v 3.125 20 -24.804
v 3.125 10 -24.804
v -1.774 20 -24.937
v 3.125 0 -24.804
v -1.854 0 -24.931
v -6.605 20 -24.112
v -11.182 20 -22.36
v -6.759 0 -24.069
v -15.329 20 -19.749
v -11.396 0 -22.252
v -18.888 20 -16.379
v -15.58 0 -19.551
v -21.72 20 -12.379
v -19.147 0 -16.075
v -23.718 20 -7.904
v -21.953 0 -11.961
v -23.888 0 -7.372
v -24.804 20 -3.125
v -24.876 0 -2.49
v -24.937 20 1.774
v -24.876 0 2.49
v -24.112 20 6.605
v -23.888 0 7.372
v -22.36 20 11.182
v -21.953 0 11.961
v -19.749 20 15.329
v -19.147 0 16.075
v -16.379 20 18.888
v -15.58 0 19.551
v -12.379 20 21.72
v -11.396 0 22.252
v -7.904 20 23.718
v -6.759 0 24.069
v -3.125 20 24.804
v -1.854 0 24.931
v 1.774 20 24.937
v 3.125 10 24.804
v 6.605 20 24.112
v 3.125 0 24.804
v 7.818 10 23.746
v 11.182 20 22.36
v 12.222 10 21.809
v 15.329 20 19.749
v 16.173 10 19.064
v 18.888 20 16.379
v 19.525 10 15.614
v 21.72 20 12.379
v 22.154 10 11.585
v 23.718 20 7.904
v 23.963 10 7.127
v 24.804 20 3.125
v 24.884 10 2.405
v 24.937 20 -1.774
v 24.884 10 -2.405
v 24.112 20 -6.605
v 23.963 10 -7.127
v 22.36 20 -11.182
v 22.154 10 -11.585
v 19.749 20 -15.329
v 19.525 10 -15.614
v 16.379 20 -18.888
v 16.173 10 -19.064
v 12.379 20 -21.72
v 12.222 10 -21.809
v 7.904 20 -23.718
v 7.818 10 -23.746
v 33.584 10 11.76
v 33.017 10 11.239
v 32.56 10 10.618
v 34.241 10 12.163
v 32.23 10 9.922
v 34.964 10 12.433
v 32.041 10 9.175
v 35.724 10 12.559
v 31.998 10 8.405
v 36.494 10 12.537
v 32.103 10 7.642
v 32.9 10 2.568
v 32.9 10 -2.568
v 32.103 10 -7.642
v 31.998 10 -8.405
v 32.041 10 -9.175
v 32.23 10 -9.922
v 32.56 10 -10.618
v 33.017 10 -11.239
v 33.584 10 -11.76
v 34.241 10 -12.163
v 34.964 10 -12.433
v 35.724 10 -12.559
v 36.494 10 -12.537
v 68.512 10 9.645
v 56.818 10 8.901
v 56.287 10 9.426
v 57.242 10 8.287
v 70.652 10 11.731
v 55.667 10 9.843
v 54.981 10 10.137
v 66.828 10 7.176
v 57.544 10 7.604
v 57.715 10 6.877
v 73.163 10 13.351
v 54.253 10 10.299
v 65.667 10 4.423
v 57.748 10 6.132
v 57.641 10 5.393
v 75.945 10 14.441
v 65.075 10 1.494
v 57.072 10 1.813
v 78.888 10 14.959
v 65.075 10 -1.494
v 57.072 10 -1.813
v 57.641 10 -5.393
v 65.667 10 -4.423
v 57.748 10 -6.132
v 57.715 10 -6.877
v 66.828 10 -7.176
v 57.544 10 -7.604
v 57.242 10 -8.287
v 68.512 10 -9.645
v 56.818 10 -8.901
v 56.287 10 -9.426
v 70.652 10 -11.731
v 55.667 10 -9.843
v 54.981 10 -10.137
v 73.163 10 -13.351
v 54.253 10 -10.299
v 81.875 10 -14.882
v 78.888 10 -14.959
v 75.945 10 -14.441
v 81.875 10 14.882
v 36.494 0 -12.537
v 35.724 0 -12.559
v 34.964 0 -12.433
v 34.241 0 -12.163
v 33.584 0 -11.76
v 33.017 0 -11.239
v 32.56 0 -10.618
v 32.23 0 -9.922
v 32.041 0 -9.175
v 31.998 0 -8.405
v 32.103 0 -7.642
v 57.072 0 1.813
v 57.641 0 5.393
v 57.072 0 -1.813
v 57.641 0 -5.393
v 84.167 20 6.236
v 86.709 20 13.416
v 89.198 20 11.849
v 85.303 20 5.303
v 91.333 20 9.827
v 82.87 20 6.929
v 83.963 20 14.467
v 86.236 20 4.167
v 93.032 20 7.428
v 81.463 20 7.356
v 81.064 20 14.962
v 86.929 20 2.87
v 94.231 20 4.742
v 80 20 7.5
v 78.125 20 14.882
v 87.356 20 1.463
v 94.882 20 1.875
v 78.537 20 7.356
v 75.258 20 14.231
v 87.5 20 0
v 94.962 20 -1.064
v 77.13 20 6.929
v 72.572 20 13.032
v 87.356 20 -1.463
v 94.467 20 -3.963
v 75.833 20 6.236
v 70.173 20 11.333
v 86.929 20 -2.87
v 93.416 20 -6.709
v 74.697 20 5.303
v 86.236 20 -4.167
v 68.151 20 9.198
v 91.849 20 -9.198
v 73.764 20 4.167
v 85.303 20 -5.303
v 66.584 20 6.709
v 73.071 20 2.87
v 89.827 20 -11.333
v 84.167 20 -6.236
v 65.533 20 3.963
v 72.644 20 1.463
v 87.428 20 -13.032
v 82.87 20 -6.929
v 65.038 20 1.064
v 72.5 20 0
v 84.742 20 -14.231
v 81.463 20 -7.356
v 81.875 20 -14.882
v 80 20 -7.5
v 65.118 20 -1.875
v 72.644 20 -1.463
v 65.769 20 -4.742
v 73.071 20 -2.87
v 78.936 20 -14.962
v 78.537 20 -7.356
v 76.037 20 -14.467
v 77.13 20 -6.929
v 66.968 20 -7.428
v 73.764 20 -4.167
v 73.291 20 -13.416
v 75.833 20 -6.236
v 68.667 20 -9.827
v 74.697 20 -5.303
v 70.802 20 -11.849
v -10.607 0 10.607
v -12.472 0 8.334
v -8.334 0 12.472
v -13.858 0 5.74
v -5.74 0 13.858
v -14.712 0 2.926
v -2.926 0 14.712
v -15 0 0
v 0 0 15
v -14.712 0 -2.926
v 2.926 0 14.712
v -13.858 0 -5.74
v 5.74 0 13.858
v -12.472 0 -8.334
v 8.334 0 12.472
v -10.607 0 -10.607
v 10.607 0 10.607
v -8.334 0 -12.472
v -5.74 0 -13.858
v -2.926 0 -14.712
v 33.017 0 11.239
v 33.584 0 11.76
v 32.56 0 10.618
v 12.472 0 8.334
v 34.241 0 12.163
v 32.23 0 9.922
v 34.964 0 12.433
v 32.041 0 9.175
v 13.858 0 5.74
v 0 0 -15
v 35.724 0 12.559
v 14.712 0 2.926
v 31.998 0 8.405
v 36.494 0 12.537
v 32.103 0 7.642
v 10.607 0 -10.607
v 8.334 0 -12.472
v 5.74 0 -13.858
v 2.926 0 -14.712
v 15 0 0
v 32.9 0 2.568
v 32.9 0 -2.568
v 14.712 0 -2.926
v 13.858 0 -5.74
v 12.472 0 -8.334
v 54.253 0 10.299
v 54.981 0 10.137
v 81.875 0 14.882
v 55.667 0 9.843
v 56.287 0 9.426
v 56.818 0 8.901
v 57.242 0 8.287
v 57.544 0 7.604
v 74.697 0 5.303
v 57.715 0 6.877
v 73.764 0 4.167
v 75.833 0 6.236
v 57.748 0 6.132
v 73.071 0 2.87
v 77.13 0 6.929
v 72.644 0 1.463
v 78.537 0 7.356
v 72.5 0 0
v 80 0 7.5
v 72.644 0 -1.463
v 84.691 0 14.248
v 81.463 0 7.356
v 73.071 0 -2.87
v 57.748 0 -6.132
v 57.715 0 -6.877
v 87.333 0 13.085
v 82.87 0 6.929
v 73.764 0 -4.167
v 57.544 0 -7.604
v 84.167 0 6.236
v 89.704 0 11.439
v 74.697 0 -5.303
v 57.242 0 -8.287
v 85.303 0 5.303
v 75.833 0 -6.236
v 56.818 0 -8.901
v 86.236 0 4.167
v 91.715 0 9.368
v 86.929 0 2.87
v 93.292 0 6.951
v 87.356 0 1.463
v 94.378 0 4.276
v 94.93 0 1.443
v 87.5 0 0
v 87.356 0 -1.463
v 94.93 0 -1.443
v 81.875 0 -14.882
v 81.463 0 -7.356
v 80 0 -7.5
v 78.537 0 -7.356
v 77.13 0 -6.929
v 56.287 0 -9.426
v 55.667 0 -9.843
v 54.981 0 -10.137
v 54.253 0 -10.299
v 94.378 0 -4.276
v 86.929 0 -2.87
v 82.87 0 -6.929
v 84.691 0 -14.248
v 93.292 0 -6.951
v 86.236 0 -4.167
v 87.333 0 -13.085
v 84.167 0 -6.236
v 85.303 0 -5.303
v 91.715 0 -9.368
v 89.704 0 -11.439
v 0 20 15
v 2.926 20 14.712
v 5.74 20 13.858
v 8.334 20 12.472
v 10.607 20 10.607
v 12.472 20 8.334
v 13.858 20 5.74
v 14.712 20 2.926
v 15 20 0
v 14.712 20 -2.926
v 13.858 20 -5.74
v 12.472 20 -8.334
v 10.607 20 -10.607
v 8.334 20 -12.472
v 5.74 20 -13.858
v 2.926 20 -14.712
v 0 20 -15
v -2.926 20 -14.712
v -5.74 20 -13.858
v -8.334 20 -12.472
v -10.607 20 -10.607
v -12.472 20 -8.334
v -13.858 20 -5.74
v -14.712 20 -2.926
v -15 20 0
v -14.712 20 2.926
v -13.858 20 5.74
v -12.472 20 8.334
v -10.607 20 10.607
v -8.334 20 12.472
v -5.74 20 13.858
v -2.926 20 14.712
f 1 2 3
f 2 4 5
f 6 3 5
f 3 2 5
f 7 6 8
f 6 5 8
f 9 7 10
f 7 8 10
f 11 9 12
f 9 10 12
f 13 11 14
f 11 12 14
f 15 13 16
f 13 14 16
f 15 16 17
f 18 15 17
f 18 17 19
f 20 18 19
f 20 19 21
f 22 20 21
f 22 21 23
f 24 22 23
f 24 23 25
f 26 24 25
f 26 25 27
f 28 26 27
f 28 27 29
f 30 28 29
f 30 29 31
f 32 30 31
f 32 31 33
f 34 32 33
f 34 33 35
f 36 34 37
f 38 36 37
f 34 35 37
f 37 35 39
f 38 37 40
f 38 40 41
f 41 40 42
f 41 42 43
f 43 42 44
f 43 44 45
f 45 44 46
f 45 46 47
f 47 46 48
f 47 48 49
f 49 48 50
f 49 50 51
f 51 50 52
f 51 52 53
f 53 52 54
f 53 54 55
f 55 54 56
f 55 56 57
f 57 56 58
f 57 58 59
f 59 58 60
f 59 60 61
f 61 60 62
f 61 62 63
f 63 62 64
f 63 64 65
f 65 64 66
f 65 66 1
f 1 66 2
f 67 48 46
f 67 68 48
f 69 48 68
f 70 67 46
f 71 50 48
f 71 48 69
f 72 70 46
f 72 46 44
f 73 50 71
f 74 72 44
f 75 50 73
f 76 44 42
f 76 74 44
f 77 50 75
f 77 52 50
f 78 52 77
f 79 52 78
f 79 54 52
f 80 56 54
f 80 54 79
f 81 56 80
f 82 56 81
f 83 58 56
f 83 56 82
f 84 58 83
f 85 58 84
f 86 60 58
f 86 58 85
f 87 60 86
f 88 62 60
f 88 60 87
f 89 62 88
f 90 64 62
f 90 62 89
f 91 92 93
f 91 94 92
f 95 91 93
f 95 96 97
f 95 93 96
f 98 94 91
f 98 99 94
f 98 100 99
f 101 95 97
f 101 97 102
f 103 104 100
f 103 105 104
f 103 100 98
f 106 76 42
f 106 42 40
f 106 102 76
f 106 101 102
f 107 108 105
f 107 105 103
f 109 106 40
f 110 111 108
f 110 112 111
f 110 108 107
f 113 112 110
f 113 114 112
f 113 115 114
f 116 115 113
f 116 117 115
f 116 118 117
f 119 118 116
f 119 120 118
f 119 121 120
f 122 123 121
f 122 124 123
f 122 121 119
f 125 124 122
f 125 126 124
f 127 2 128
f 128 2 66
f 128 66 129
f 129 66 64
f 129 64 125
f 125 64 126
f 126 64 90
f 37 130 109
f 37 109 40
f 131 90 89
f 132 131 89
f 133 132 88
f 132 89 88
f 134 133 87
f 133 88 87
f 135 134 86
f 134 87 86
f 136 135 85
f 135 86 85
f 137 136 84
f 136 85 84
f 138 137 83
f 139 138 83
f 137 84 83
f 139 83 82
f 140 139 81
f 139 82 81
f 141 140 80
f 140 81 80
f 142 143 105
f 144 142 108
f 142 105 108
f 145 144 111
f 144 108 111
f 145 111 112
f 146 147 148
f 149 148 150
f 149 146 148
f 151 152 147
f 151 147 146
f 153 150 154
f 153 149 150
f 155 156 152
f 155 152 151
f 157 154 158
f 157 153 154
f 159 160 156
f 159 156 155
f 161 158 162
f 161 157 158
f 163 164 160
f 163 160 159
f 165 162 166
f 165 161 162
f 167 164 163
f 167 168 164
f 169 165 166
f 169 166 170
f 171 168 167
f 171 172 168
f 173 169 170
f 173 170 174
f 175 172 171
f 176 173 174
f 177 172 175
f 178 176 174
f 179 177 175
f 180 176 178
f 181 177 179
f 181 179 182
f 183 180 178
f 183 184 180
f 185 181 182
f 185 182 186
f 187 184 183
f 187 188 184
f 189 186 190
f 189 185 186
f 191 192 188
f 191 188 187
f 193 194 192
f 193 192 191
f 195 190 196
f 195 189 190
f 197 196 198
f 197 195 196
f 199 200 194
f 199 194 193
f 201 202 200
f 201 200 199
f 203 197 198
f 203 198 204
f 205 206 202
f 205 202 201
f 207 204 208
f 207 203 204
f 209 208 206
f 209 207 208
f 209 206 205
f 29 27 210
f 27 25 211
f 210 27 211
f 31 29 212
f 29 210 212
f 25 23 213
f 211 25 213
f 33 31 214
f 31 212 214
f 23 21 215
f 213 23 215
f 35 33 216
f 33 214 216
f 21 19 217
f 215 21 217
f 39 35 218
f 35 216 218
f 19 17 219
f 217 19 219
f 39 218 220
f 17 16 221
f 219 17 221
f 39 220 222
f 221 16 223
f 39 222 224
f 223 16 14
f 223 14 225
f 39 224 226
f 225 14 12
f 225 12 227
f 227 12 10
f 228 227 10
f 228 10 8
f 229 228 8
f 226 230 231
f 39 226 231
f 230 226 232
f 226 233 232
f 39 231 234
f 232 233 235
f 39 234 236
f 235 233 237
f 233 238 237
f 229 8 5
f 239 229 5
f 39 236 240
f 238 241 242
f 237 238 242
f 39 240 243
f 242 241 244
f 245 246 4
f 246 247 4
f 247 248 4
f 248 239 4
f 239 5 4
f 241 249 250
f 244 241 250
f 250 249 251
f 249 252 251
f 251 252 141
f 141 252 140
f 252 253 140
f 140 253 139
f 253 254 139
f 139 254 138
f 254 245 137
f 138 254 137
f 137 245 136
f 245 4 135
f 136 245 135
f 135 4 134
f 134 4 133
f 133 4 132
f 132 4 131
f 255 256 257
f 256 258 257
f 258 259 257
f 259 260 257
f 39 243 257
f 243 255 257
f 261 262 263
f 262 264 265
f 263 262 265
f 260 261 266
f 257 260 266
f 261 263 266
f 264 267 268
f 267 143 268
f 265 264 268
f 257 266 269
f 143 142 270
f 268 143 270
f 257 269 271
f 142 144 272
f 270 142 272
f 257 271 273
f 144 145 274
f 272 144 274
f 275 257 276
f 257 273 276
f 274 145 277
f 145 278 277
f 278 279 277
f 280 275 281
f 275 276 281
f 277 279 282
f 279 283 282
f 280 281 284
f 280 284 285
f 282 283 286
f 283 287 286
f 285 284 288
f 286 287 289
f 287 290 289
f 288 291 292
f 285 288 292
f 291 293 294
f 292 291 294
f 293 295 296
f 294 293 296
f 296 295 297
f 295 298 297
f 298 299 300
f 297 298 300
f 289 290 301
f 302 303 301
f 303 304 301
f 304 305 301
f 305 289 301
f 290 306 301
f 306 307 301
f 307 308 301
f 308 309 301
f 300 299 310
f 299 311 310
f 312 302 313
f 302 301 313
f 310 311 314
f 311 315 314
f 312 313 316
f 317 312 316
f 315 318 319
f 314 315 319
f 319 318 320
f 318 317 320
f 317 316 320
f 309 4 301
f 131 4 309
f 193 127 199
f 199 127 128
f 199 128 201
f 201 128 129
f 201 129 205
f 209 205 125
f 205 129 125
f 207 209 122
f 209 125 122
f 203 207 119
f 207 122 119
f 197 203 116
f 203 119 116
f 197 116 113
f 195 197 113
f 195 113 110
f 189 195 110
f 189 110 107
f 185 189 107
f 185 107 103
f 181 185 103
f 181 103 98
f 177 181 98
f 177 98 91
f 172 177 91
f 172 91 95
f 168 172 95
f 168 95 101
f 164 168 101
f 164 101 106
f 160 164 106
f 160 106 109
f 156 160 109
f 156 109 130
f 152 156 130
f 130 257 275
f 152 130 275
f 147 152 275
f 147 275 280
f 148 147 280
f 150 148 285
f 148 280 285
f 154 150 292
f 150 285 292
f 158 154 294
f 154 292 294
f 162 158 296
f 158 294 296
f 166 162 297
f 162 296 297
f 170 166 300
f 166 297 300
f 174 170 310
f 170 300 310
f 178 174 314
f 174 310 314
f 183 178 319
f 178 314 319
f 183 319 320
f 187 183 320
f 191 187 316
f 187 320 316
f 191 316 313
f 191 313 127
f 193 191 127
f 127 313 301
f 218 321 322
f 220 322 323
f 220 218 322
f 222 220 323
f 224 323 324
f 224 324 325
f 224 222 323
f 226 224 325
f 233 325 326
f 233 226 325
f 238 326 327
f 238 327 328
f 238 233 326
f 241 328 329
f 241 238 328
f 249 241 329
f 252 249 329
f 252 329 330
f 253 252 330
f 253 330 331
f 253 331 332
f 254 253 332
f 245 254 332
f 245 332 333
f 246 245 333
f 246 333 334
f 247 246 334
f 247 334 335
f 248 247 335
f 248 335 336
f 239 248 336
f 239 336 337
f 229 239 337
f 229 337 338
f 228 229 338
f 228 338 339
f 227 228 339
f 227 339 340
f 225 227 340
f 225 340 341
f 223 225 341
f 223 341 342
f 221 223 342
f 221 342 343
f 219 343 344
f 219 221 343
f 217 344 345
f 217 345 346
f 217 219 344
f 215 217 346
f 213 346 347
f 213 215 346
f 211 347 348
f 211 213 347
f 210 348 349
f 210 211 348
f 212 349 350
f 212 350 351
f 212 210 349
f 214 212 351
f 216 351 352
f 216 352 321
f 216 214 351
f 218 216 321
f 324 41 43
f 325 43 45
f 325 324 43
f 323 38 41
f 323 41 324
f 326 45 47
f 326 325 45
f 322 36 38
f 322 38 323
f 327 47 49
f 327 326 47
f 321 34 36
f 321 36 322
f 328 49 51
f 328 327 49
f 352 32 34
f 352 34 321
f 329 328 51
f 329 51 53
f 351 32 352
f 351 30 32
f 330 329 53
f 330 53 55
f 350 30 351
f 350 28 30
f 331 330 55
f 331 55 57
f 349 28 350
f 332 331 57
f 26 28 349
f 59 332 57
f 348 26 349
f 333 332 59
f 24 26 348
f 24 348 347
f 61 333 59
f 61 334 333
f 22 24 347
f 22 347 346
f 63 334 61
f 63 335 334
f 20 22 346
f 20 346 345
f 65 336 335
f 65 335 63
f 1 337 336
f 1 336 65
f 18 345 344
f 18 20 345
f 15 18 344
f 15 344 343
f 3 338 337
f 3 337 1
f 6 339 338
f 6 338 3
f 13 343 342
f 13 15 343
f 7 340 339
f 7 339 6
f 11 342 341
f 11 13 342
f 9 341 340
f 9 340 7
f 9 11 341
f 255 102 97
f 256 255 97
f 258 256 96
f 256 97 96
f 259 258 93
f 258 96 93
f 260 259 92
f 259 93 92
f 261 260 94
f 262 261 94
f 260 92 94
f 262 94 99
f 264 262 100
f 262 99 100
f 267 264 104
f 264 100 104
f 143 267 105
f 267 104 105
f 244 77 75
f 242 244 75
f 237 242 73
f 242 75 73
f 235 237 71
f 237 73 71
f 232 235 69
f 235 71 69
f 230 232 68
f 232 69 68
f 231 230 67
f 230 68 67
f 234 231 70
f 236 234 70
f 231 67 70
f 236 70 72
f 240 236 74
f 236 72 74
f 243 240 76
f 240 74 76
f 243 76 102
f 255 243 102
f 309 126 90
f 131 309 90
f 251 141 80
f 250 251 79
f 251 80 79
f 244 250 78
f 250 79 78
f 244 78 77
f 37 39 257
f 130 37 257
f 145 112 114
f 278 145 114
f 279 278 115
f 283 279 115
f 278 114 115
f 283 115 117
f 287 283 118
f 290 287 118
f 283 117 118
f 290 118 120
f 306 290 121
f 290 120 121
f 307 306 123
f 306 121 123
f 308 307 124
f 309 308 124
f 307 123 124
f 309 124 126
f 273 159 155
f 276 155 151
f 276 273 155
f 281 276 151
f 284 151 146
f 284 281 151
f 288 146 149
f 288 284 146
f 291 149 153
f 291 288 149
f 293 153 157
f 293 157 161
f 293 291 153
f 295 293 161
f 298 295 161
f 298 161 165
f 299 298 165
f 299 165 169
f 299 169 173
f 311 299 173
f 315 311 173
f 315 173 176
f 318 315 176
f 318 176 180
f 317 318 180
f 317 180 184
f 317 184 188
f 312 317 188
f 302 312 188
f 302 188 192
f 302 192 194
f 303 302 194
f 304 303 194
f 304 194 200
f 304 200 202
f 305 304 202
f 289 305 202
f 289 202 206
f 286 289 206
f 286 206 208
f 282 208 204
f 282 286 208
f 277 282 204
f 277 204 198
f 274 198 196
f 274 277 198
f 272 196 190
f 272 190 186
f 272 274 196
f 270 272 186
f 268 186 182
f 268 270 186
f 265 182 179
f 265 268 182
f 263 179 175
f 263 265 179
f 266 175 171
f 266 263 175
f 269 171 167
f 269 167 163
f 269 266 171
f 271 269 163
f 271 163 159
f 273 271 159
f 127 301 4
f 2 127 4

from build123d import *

# Parameters (mm, degrees)
SKETCH1_R           = 7.5
SKETCH1_R_2         = 15
BOSS_EXTRUDE1_DEPTH = 10
SKETCH1_3_R         = 25
SKETCH1_3_R_2       = 15
SKETCH1_3_R_3       = 7.5
BOSS_EXTRUDE2_DEPTH = 20
CUT_EXTRUDE1_DEPTH  = 20


with BuildPart() as part:
    # Sketch1 → Boss-Extrude1 (new body)
    with BuildSketch(Plane(origin=(0, 0, 0), x_dir=(1, 0, 0), z_dir=(0, 1, 0))):
        with BuildLine():
            Line((81.875, 14.882351125), (3.125, 24.803918541))
            ThreePointArc((3.125, 24.803918541), (-25, 0), (3.125, -24.803918541))
            Line((3.125, -24.803918541), (81.875, -14.882351125))
            ThreePointArc((81.875, -14.882351125), (95, 0), (81.875, 14.882351125))
        make_face()
        with Locations((80, 0)):
            Circle(SKETCH1_R, mode=Mode.SUBTRACT)
        Circle(SKETCH1_R_2, mode=Mode.SUBTRACT)
    extrude(amount=BOSS_EXTRUDE1_DEPTH)

    # Sketch1<3> → Boss-Extrude2 (add)
    # profile 1 of 2: a face of its own
    with BuildSketch(Plane(origin=(0, 0, 0), x_dir=(1, 0, 0), z_dir=(0, 1, 0))):
        Circle(SKETCH1_3_R)
        Circle(SKETCH1_3_R_2, mode=Mode.SUBTRACT)
    # profile 2 of 2: a face of its own
    with BuildSketch(Plane(origin=(0, 0, 0), x_dir=(1, 0, 0), z_dir=(0, 1, 0))):
        with Locations((80, 0)):
            Circle(SKETCH1_3_R_2)
        with Locations((80, 0)):
            Circle(SKETCH1_3_R_3, mode=Mode.SUBTRACT)
    extrude(amount=BOSS_EXTRUDE2_DEPTH)

    # Sketch2 → Cut-Extrude1 (cut)
    with BuildSketch(Plane(origin=(0, 10, 0), x_dir=(1, 0, 0), z_dir=(0, 1, 0))):
        with BuildLine():
            Line((36.494317712, -12.536537589), (54.252640976, -10.299199158))
            ThreePointArc((54.252640976, -10.299199158), (57.044014201, -8.603645506), (57.641138609, -5.392709644))
            ThreePointArc((57.641138609, -5.392709644), (57, 0), (57.641138609, 5.392709644))
            ThreePointArc((57.641138609, 5.392709644), (57.044014201, 8.603645506), (54.252640976, 10.299199158))
            Line((54.252640976, 10.299199158), (36.494317712, 12.536537589))
            ThreePointArc((36.494317712, 12.536537589), (33.016873839, 11.239020501), (32.103040122, 7.641650015))
            ThreePointArc((32.103040122, 7.641650015), (33, 0), (32.103040122, -7.641650015))
            ThreePointArc((32.103040122, -7.641650015), (33.016873839, -11.239020501), (36.494317712, -12.536537589))
        make_face()
    extrude(amount=-CUT_EXTRUDE1_DEPTH, mode=Mode.SUBTRACT)


solid = part.part
